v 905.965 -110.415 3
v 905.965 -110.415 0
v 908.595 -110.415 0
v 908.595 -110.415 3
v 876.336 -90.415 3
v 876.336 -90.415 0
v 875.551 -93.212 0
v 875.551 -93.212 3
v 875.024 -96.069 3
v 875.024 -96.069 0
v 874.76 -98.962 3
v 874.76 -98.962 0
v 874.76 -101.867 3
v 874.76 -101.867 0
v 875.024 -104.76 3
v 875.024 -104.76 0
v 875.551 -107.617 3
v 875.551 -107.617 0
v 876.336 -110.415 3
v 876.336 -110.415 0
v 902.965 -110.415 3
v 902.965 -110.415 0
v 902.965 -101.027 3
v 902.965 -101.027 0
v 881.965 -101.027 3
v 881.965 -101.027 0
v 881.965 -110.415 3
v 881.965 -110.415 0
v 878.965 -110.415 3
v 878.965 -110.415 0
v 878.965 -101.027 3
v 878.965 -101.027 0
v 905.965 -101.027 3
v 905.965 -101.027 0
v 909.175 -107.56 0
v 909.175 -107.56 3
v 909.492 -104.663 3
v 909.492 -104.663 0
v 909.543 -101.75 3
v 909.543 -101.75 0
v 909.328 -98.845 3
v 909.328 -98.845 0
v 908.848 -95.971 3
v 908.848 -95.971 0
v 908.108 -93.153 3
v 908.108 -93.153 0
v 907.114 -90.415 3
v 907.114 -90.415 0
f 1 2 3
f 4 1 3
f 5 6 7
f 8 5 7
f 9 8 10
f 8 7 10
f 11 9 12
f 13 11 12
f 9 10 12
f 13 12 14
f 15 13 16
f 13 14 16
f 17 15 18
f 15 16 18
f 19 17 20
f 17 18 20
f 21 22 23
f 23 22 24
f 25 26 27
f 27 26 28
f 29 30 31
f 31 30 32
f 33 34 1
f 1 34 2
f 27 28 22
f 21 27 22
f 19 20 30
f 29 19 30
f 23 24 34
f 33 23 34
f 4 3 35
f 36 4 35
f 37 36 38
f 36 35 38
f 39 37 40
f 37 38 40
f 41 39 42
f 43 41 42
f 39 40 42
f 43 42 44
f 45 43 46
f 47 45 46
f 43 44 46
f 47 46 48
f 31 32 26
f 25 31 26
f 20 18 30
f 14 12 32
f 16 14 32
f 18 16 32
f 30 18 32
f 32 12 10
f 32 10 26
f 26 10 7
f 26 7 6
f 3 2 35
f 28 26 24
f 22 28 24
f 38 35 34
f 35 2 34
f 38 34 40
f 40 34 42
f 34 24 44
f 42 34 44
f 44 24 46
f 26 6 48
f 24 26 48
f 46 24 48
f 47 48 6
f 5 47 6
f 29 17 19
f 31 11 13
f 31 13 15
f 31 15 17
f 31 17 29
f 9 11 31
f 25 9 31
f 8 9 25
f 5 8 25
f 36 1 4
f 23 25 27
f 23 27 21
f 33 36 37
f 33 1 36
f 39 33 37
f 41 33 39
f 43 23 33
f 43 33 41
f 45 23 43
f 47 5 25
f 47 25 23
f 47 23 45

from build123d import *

# Parameters (mm, degrees)
BASE_EXTRUDE_DEPTH = 3


with BuildPart() as part:
    # Sketch1 → Base-Extrude (new body)
    with BuildSketch(Plane.XY):
        with BuildLine():
            Line((905.965375708, -110.41468189), (908.594990659, -110.41468189))
            ThreePointArc((908.594990659, -110.41468189), (909.468405337, -100.295175968), (907.11402855, -90.41468189))
            Line((907.11402855, -90.41468189), (876.335760757, -90.41468189))
            ThreePointArc((876.335760757, -90.41468189), (874.726506158, -100.41468189), (876.335760757, -110.41468189))
            Line((876.335760757, -110.41468189), (878.965375708, -110.41468189))
            Line((878.965375708, -110.41468189), (878.965375708, -101.027413417))
            Line((878.965375708, -101.027413417), (881.965375708, -101.027413417))
            Line((881.965375708, -101.027413417), (881.965375708, -110.41468189))
            Line((881.965375708, -110.41468189), (892.465375708, -110.41468189))
            Line((892.465375708, -110.41468189), (902.965375708, -110.41468189))
            Line((902.965375708, -110.41468189), (902.965375708, -101.027413417))
            Line((902.965375708, -101.027413417), (905.965375708, -101.027413417))
            Line((905.965375708, -101.027413417), (905.965375708, -110.41468189))
        make_face()
    extrude(amount=BASE_EXTRUDE_DEPTH)


solid = part.part
